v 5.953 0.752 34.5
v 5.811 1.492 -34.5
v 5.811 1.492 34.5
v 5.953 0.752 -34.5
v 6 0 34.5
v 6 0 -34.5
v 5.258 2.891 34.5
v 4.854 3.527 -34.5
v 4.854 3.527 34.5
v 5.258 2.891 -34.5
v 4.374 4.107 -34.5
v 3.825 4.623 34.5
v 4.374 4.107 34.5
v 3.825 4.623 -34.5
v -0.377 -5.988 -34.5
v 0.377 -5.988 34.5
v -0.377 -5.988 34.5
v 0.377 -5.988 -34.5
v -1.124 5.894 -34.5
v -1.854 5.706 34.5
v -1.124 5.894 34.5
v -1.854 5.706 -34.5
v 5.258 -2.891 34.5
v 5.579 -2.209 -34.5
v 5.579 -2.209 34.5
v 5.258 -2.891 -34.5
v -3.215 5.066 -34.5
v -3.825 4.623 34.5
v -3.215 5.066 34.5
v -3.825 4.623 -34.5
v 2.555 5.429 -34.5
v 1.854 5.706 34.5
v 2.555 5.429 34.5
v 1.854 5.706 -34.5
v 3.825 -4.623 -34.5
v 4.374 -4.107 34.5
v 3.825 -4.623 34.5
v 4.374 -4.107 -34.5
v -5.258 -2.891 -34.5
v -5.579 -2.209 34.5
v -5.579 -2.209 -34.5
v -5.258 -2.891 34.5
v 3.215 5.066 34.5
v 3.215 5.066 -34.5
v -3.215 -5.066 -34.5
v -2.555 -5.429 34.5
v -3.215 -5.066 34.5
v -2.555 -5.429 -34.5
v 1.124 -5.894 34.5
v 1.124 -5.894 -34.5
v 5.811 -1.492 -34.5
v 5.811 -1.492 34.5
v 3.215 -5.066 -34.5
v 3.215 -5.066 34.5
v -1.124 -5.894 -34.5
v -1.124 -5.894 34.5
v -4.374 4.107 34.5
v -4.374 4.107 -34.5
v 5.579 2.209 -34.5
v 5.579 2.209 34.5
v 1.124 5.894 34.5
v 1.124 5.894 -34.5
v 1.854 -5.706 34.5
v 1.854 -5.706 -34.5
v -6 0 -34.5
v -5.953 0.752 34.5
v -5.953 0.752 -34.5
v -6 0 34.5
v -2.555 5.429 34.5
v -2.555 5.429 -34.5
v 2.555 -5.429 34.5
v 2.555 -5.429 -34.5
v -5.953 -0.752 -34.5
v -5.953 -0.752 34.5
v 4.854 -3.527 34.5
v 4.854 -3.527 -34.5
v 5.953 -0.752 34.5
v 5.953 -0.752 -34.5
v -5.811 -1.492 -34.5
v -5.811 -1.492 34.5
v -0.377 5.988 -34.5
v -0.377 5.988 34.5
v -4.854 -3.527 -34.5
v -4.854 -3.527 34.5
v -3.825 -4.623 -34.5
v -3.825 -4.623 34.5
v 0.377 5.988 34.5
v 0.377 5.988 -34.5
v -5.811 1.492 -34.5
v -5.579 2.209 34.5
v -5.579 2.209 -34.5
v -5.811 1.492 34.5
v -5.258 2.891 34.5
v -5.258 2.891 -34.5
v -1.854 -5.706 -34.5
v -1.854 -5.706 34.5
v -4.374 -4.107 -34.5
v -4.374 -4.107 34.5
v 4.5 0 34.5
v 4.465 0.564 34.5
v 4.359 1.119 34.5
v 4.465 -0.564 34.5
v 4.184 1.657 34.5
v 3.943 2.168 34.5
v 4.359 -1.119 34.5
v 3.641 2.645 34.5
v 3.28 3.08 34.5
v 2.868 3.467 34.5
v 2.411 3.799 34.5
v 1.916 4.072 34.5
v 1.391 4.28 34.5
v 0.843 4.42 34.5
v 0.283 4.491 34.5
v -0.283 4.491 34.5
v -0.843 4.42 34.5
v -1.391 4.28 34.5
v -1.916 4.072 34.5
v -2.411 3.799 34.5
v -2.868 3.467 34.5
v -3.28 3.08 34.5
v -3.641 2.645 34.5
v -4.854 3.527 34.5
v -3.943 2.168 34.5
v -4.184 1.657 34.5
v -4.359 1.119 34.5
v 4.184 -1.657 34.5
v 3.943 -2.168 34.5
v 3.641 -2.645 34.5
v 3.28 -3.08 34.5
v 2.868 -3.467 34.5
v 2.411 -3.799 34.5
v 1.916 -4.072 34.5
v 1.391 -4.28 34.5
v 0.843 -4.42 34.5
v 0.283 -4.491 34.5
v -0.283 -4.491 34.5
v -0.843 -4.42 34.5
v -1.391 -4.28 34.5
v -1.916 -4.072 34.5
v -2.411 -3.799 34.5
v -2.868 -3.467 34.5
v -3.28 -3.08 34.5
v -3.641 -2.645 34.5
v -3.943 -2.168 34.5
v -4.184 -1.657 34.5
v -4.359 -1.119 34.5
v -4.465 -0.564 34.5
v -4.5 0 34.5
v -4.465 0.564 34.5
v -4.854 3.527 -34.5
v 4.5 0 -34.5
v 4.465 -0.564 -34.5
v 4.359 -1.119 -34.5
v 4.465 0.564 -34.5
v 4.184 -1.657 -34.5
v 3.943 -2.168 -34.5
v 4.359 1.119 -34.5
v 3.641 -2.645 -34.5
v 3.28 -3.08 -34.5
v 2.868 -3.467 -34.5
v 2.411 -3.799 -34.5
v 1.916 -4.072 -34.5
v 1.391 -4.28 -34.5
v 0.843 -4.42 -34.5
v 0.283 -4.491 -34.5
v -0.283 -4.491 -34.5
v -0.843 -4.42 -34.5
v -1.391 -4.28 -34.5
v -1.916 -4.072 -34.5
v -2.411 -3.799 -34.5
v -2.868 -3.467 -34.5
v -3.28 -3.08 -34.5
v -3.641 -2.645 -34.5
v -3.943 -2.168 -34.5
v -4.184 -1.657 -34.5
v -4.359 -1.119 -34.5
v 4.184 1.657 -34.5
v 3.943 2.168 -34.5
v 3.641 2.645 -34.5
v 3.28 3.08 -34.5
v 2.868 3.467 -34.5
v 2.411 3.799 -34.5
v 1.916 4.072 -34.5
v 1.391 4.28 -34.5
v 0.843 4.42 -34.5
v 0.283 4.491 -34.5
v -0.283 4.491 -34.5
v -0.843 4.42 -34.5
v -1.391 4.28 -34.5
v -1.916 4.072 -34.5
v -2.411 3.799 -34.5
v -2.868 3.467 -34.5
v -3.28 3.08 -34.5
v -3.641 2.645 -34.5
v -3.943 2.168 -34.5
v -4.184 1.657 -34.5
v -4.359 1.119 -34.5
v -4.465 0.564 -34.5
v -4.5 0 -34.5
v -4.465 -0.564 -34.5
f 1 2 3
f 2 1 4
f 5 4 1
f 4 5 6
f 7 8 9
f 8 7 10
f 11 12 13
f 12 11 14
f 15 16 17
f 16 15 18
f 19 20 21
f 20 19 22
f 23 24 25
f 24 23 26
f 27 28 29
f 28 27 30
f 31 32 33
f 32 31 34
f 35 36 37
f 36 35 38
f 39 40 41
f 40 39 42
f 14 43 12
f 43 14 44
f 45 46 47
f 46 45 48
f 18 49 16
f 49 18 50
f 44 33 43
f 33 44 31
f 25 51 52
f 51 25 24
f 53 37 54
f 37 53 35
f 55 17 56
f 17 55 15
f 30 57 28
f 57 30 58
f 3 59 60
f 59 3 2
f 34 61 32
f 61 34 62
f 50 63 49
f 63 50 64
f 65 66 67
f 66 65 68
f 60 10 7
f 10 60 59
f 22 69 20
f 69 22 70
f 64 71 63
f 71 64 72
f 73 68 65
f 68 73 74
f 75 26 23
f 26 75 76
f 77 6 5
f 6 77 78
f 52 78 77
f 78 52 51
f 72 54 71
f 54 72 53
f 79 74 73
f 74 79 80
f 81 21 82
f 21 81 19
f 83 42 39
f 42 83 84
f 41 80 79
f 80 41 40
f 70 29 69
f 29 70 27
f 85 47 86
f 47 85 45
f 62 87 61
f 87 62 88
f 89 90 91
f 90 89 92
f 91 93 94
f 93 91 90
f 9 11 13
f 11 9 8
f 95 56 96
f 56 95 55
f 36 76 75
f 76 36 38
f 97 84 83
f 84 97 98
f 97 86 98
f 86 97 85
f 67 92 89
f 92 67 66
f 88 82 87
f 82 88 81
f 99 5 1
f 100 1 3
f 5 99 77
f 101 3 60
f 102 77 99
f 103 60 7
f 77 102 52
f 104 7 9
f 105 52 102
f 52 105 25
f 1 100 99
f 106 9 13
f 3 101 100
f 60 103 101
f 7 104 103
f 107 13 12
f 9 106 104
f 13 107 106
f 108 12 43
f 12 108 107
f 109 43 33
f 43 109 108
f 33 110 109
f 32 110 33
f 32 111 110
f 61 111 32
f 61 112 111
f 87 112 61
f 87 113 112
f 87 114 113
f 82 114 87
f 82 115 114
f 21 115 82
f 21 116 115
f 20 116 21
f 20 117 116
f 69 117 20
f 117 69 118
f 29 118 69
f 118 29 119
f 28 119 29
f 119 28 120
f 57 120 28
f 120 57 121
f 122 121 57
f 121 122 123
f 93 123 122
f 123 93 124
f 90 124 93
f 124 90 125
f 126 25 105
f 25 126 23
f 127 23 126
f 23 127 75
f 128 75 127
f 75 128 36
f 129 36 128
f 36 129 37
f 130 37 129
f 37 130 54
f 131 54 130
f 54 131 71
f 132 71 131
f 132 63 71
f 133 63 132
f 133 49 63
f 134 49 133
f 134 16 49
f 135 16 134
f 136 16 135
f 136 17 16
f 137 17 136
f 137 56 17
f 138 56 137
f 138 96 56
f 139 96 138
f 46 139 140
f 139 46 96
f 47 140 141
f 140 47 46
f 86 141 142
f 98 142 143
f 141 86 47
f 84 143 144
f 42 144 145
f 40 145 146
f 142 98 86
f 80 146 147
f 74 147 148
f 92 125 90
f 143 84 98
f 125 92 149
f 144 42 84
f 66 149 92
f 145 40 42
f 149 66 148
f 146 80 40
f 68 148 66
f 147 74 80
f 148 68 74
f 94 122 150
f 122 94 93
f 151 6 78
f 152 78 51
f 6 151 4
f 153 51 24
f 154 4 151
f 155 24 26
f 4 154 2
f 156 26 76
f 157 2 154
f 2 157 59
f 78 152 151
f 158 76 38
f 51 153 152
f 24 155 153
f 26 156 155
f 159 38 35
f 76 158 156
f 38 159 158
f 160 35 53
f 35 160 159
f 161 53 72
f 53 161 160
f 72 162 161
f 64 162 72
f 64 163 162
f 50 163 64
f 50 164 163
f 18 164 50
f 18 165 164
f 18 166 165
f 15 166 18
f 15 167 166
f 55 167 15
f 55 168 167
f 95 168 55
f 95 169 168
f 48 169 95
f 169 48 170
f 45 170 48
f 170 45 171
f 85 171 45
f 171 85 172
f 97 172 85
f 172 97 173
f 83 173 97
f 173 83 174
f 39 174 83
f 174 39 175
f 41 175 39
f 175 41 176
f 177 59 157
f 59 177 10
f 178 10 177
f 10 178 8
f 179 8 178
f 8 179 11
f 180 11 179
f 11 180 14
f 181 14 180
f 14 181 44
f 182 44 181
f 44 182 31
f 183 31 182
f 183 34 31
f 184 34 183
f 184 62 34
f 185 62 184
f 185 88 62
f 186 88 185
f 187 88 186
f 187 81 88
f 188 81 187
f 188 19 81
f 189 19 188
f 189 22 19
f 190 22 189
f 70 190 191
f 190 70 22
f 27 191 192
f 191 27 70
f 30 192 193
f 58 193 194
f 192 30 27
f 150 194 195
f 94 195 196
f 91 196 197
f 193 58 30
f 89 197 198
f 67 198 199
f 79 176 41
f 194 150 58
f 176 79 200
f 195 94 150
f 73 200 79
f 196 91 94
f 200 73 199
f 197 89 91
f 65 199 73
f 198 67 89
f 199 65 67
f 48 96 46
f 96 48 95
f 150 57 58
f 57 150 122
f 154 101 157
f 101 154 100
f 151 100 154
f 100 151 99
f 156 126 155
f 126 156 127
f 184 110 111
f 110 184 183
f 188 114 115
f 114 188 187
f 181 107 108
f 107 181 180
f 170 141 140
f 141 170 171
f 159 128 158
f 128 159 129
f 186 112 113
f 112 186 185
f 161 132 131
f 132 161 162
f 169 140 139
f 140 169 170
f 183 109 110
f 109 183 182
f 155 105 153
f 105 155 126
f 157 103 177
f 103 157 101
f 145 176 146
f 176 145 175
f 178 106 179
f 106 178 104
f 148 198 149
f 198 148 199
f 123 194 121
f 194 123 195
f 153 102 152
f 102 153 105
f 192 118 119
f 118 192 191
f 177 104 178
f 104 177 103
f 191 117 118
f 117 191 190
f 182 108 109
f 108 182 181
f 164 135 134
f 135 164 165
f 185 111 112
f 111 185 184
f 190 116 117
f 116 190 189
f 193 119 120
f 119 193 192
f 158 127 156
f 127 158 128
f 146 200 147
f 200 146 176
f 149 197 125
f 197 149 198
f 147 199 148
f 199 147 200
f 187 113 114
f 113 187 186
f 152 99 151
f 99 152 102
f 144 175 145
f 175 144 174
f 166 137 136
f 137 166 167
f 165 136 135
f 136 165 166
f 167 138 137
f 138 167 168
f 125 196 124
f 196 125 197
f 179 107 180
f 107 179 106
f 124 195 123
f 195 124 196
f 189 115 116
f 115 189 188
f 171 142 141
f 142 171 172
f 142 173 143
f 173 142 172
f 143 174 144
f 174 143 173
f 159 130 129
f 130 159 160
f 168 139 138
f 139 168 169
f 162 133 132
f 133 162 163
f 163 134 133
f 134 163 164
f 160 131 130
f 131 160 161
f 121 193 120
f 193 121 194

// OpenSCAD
$fn = 50;


difference() {
	union() {
		translate(v = [0, 0, -34.5000000000]) {
			cylinder(h = 69, r = 6.0000000000);
		}
	}
	union() {
		translate(v = [0, 0, -100.0000000000]) {
			cylinder(h = 200, r = 4.5000000000);
		}
	}
}
